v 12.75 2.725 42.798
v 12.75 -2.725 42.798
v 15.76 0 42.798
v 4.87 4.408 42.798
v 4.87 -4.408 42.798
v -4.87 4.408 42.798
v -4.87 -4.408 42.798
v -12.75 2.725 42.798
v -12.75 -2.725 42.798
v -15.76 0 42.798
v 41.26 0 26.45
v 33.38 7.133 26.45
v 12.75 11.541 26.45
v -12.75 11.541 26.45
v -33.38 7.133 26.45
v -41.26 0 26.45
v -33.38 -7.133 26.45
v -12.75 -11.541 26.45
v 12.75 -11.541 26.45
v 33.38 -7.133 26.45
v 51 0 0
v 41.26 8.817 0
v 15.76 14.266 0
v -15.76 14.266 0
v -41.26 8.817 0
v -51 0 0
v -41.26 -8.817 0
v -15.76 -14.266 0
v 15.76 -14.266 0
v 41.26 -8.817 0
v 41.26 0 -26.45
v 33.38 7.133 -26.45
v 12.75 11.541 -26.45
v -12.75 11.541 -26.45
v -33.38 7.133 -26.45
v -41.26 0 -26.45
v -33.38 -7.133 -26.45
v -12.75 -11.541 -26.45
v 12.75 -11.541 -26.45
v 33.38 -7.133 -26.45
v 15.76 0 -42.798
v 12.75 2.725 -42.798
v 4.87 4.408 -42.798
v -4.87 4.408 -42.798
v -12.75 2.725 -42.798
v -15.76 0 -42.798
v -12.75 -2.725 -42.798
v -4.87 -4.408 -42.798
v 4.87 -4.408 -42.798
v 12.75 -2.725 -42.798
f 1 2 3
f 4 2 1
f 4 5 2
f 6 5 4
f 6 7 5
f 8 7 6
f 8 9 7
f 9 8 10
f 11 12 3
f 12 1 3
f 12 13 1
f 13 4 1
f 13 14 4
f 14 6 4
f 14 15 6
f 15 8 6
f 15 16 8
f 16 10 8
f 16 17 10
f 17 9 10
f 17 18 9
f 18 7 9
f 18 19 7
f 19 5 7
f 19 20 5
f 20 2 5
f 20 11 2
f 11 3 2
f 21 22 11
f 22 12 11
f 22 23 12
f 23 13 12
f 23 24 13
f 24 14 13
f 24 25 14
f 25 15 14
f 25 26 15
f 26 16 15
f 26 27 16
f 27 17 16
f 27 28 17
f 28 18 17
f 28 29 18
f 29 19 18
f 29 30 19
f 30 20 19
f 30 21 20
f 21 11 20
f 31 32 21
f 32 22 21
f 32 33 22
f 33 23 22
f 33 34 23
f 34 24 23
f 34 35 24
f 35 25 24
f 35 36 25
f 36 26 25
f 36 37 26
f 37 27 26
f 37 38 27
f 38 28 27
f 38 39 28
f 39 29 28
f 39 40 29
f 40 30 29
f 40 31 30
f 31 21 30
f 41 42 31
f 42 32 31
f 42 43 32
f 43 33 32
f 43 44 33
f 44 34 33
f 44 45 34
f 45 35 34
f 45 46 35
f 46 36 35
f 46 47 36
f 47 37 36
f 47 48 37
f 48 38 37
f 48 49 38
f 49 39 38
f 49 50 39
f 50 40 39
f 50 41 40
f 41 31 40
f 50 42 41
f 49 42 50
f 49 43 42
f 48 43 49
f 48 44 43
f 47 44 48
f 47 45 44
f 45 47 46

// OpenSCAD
// Generated by SolidPython 1.0.1 on 2020-07-29 00:46:52


scale(v = [17, 5, 15]) {
	sphere(r = 3);
}
/***********************************************
*********      SolidPython code:      **********
************************************************
 
# import packages: SolidPython
from solid import *
from solid.utils import *
from itertools import chain, combinations, permutations


class Resize:

    def __init__(self, scad_file):
        self.scad_file = scad_file
        #self.scad_file = import_scad(scad_file)
        # cone/cylinder param:
        self.r1 = 0
        self.r2 = 0
        self.h = 0
        # rectangular prism param:
        self.w = 0
        self.l = 0
        # ellipse param:
        self.r = 0

    # import OpenScad code (file name corresponds to shape)


    # classify shape + parameters
    def assign(self, param1, param2, param3):
        if self.scad_file == 'cone.scad':
            self.r1 = param1
            self.r2 = param2
            self.h = param3
        elif self.scad_file == 'cylinder.scad':
            self.r1 = param1
            self.r2 = param2
            self.h = param3
        elif self.scad_file == 'rectangularPrism.scad':
            self.h = param1
            self.l = param2
            self.w = param3
        else:
            self.r = param1
            self.h = param2

    # resize parameters
    def iterate(self):
        x = range(3, 20, 2)
        i = 1
        if self.scad_file == 'cone.scad':
            tempList = list(permutations(x, 2))
            for temp in tempList:
                param1 = temp[0]
                param2 = temp[1]
                filepath = 'produced_scad_files/' + 'cone' + str(param1) + '_' + str(param2) + '_' + '.scad'
                scad_render_to_file(cylinder(h=param1, r1=param2, r2=0), filepath)

        elif self.scad_file == 'cylinder.scad':
            tempList = list(permutations(x, 3))
            for temp in tempList:
                param1 = temp[0]
                param2 = temp[1]
                filepath = 'produced_scad_files/' + 'cylinder' + str(param1) + '_' + str(param2) + '_' + '.scad'
                scad_render_to_file(cylinder(h=param1, r1=param2, r2=param2), filepath)

        elif self.scad_file == 'rectangularPrism.scad':
            tempList = list(permutations(x, 3))
            for temp in tempList:
                param1 = temp[0]
                param2 = temp[1]
                param3 = temp[2]
                filepath = 'produced_scad_files/' + 'rectangularPrism' + str(param1) + '_' + str(param2) + '_' + str(
                    param3) + '.scad'
                scad_render_to_file(cube(size=(param1, param2, param3)), filepath)

        elif self.scad_file == 'ellipse.scad':
            tempList = list(permutations(x, 4))
            for temp in tempList:
                param1 = temp[0]
                param2 = temp[1]
                param3 = temp[2]
                param4 = temp[3]
                filepath = 'produced_scad_files/' + 'ellipse' + str(param1) + '_' + str(param2) + '_' + str(param3) + '_' + str(param4) + '.scad'
                scad_render_to_file(scale([param1, param2, param3])(sphere(r=param4)), filepath)

    def render_to_scadfile(self):
        scad_render_to_file(scad, 'example.scad') 
 
************************************************/
